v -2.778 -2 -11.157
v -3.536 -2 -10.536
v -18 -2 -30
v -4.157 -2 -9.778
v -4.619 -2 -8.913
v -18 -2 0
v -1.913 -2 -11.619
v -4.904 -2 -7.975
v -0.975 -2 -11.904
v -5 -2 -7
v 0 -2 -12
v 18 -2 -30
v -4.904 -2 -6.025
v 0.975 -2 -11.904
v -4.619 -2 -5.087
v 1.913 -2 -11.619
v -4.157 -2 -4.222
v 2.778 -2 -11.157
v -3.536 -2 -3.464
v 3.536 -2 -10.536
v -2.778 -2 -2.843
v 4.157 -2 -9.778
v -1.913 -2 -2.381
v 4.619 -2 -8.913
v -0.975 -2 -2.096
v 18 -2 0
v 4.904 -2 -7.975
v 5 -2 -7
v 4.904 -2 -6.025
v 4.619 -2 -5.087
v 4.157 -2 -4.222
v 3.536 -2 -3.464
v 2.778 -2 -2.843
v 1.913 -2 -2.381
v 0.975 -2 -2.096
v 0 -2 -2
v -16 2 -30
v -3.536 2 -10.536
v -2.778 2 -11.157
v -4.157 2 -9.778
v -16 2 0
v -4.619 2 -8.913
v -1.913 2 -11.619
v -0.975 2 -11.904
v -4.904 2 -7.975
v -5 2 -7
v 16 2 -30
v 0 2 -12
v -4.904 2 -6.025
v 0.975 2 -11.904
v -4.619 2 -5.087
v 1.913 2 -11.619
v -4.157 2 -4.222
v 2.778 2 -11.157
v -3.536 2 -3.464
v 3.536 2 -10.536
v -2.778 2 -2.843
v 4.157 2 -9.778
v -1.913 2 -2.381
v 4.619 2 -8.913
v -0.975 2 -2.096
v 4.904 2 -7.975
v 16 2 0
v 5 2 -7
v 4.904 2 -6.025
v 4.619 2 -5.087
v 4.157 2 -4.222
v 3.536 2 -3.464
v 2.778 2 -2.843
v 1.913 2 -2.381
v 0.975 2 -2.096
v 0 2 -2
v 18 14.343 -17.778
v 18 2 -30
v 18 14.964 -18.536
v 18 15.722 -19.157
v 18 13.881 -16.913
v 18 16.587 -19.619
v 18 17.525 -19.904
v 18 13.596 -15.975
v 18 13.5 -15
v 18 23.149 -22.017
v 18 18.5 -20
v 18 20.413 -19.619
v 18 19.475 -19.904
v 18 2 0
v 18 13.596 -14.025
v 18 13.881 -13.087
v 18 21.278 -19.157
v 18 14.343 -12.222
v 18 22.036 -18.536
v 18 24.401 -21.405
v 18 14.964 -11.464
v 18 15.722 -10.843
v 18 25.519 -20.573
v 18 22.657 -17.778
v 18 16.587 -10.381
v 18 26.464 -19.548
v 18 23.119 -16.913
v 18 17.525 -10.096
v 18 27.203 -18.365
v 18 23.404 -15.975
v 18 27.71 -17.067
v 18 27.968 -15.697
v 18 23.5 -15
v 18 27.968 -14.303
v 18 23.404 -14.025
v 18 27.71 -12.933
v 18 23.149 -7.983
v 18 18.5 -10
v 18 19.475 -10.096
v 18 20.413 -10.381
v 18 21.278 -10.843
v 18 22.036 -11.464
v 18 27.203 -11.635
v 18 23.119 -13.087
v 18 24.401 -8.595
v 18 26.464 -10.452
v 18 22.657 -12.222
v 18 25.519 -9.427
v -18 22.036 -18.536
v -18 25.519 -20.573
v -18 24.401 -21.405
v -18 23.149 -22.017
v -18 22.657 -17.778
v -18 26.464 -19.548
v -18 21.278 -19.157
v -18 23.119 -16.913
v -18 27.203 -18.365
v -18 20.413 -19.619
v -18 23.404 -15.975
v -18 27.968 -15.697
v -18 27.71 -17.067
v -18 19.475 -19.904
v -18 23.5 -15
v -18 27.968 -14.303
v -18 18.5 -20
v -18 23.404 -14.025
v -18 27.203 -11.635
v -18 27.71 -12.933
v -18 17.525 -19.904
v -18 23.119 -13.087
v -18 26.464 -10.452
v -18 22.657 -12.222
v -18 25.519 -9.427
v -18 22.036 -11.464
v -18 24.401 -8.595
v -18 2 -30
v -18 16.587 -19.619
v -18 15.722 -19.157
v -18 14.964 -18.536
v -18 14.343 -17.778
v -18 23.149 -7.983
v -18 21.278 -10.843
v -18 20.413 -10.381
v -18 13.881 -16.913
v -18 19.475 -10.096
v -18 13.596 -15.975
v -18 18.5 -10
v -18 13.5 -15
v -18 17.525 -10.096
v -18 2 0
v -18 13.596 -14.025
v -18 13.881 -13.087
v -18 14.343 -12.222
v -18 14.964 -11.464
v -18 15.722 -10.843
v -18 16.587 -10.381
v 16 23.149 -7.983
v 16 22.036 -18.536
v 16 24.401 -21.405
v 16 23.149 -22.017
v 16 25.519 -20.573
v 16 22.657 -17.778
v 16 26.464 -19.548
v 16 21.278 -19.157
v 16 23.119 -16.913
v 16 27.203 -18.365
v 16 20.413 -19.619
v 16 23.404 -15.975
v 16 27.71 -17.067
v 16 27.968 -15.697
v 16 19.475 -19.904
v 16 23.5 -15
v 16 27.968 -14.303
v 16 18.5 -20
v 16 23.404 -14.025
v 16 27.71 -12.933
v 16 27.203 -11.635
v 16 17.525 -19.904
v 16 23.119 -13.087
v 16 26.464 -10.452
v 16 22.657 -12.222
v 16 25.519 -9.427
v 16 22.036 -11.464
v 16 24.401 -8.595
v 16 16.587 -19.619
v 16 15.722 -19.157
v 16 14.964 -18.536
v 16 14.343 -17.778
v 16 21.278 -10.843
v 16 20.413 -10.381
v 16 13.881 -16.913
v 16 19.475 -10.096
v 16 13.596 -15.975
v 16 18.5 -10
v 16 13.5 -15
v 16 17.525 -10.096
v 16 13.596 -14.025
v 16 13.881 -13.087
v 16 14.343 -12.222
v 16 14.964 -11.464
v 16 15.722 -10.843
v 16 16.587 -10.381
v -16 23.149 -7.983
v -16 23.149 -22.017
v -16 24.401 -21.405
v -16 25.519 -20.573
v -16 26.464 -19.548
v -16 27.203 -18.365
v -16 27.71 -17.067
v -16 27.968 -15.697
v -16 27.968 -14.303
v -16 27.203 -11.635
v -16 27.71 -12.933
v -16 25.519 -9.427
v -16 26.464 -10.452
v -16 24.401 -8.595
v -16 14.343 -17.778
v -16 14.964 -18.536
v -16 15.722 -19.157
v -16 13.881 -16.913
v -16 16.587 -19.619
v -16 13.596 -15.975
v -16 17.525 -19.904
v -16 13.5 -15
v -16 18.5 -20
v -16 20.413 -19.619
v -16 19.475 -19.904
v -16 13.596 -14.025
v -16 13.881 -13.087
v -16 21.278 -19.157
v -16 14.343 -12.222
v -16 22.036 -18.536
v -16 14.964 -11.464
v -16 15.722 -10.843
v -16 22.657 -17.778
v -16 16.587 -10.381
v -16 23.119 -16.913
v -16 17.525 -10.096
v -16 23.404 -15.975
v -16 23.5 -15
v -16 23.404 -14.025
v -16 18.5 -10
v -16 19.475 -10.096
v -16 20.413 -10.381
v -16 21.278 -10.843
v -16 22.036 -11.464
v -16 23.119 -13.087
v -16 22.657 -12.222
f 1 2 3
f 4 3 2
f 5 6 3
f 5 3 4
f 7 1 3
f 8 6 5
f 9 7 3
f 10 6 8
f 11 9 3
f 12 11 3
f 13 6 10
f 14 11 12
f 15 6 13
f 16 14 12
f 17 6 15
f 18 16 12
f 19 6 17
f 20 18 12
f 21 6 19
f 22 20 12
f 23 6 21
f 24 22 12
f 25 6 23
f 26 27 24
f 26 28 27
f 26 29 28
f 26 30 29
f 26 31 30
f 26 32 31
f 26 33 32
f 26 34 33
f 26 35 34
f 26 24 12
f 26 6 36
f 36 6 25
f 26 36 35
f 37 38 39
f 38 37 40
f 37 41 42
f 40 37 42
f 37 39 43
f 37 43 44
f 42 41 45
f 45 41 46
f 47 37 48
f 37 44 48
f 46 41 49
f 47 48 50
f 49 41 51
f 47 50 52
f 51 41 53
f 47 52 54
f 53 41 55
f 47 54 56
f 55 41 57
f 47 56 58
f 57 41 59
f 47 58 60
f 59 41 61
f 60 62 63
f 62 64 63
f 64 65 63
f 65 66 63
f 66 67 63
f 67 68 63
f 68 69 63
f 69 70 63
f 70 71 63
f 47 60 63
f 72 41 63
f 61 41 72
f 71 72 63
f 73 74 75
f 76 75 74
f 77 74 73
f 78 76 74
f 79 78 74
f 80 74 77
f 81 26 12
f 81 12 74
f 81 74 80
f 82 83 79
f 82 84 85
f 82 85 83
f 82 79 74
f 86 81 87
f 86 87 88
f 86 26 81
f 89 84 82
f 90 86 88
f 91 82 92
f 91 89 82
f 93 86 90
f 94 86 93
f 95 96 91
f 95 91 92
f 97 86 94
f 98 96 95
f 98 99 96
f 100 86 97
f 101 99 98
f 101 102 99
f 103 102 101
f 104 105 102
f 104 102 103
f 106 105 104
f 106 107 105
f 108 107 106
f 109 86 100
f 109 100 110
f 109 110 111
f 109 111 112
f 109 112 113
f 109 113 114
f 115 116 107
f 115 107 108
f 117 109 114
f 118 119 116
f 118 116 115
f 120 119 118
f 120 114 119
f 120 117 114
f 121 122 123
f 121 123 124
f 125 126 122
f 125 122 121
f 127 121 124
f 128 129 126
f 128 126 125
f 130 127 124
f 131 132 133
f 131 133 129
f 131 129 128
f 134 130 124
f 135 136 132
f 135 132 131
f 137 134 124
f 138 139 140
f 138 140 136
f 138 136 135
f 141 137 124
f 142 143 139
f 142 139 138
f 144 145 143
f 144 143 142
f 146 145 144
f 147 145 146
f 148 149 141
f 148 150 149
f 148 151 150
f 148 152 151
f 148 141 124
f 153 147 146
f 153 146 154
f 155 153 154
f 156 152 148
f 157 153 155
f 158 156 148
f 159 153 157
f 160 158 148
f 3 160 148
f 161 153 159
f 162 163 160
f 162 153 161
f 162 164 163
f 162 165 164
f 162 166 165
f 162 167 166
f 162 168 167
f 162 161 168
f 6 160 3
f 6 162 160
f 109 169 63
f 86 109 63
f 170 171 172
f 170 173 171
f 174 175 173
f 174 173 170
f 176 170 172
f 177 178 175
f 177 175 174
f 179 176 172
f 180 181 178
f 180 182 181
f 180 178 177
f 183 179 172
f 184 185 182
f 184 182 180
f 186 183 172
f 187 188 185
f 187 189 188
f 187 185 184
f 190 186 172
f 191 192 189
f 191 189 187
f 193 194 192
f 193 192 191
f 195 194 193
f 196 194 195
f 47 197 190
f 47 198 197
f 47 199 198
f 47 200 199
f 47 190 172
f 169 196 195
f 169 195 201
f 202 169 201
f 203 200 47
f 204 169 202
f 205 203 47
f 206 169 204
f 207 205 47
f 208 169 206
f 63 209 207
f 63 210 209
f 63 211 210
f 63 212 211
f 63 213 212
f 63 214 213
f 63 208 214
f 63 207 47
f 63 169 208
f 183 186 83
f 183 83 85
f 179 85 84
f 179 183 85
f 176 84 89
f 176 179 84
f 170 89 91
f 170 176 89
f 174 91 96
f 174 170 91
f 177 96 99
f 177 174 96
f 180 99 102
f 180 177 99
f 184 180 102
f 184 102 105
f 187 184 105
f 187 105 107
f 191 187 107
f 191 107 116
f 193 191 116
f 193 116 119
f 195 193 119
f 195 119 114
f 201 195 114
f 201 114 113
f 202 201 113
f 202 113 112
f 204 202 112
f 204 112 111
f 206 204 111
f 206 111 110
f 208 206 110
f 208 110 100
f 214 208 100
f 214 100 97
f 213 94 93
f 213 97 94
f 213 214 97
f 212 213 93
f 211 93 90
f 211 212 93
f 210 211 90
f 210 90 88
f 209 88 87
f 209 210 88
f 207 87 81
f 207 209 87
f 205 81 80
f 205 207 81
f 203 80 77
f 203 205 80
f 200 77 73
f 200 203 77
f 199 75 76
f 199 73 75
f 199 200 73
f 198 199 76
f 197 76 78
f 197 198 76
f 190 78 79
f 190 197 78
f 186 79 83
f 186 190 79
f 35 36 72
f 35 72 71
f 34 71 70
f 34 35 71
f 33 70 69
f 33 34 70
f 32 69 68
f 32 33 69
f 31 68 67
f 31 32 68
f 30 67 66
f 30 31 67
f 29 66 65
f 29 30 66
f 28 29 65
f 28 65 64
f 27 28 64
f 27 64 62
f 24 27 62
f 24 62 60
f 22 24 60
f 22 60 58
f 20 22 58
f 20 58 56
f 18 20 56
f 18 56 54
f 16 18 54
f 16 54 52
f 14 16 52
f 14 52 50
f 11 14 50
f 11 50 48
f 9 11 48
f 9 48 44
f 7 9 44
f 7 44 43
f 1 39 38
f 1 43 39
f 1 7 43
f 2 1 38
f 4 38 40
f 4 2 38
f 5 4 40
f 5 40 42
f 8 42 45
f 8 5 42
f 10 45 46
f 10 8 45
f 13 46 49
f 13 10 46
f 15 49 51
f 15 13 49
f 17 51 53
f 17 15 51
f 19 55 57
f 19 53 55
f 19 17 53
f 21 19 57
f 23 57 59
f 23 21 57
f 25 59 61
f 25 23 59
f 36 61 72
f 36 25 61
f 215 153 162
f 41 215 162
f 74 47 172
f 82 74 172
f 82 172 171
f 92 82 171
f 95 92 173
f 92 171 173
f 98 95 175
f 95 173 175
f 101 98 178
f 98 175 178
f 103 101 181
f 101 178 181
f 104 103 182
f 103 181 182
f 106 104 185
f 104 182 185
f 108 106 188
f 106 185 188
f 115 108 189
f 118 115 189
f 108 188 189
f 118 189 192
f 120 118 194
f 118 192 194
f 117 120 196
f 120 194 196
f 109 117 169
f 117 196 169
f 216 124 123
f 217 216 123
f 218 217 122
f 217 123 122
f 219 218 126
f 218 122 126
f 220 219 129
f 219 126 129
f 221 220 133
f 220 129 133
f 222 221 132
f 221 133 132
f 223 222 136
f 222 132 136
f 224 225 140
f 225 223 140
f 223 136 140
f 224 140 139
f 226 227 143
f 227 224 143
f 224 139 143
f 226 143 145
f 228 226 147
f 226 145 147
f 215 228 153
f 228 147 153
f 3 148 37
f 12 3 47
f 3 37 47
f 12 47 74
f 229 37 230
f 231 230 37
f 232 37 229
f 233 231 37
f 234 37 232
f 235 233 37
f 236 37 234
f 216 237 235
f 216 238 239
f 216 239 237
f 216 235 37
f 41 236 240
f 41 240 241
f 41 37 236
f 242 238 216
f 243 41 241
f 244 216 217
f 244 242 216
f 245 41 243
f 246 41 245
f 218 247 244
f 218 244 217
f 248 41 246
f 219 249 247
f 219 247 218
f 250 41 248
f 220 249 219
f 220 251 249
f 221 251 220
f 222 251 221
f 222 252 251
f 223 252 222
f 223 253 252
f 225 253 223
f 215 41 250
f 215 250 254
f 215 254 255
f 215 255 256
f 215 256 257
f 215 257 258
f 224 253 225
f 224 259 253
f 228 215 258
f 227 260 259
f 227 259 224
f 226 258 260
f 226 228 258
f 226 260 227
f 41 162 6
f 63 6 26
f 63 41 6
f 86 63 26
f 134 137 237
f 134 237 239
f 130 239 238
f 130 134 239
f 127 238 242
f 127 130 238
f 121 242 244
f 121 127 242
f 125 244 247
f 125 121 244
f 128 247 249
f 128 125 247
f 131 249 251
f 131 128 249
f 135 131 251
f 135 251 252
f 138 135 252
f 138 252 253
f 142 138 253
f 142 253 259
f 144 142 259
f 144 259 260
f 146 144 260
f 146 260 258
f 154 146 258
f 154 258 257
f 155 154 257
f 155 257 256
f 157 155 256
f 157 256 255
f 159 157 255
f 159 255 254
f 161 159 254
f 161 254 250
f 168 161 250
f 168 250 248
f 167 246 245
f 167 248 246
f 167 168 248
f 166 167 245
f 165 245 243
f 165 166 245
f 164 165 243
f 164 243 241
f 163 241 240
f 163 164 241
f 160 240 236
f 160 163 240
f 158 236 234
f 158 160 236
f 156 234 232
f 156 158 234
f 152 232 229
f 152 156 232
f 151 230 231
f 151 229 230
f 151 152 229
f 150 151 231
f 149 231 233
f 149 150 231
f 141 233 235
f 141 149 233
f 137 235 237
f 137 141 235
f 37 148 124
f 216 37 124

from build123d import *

# Parameters (mm, degrees)
SKETCH1_W               = 32
SKETCH1_H               = 4
BOSS_EXTRUDE1_DEPTH     = 30
CUT_EXTRUDE1_DEPTH      = 45.810713005
CUT_EXTRUDE1_DEPTH_BACK = 45.810713005
SKETCH2_R               = 5
CUT_EXTRUDE2_DEPTH      = 45.810713005
CUT_EXTRUDE2_DEPTH_BACK = 45.810713005
SKETCH3_R               = 5


with BuildPart() as part:
    # Sketch1 → Boss-Extrude1 (new body)
    with BuildSketch(Plane.XY):
        Polygon((-18, -2), (-16, -2), (-16, 2), (-16, 28), (-18, 28), align=None)
        Rectangle(SKETCH1_W, SKETCH1_H)
        Polygon((16, 2), (16, -2), (18, -2), (18, 28), (16, 28), align=None)
    extrude(amount=-BOSS_EXTRUDE1_DEPTH)

    # Sketch2 → Cut-Extrude1 (cut, two sides: drawn at the far end of the back side and taken through both)
    with BuildSketch(Plane(origin=(0, 0, 0), x_dir=(0, 0, -1), z_dir=(1, 0, 0)).offset(-CUT_EXTRUDE1_DEPTH_BACK)):
        with BuildLine():
            ThreePointArc((22.016723912, 23.148695064), (15, 28), (7.983276088, 23.148695064))
            Line((7.983276088, 23.148695064), (0, 2))
            Line((0, 2), (-5, 2))
            Line((-5, 2), (-5, 38))
            Line((-5, 38), (35, 38))
            Line((35, 38), (35, 2))
            Line((35, 2), (30, 2))
            Line((30, 2), (22.016723912, 23.148695064))
        make_face()
        with Locations((15, 18.5)):
            Circle(SKETCH2_R)
    extrude(amount=CUT_EXTRUDE1_DEPTH + CUT_EXTRUDE1_DEPTH_BACK, mode=Mode.SUBTRACT)

    # Sketch3 → Cut-Extrude2 (cut, two sides: drawn at the far end of the back side and taken through both)
    with BuildSketch(Plane(origin=(0, 0, 0), x_dir=(1, 0, 0), z_dir=(0, 1, 0)).offset(-CUT_EXTRUDE2_DEPTH_BACK)):
        with Locations(Location((0, 7, 0), (0, 0, 270))):
            Circle(SKETCH3_R)
    extrude(amount=CUT_EXTRUDE2_DEPTH + CUT_EXTRUDE2_DEPTH_BACK, mode=Mode.SUBTRACT)


solid = part.part
